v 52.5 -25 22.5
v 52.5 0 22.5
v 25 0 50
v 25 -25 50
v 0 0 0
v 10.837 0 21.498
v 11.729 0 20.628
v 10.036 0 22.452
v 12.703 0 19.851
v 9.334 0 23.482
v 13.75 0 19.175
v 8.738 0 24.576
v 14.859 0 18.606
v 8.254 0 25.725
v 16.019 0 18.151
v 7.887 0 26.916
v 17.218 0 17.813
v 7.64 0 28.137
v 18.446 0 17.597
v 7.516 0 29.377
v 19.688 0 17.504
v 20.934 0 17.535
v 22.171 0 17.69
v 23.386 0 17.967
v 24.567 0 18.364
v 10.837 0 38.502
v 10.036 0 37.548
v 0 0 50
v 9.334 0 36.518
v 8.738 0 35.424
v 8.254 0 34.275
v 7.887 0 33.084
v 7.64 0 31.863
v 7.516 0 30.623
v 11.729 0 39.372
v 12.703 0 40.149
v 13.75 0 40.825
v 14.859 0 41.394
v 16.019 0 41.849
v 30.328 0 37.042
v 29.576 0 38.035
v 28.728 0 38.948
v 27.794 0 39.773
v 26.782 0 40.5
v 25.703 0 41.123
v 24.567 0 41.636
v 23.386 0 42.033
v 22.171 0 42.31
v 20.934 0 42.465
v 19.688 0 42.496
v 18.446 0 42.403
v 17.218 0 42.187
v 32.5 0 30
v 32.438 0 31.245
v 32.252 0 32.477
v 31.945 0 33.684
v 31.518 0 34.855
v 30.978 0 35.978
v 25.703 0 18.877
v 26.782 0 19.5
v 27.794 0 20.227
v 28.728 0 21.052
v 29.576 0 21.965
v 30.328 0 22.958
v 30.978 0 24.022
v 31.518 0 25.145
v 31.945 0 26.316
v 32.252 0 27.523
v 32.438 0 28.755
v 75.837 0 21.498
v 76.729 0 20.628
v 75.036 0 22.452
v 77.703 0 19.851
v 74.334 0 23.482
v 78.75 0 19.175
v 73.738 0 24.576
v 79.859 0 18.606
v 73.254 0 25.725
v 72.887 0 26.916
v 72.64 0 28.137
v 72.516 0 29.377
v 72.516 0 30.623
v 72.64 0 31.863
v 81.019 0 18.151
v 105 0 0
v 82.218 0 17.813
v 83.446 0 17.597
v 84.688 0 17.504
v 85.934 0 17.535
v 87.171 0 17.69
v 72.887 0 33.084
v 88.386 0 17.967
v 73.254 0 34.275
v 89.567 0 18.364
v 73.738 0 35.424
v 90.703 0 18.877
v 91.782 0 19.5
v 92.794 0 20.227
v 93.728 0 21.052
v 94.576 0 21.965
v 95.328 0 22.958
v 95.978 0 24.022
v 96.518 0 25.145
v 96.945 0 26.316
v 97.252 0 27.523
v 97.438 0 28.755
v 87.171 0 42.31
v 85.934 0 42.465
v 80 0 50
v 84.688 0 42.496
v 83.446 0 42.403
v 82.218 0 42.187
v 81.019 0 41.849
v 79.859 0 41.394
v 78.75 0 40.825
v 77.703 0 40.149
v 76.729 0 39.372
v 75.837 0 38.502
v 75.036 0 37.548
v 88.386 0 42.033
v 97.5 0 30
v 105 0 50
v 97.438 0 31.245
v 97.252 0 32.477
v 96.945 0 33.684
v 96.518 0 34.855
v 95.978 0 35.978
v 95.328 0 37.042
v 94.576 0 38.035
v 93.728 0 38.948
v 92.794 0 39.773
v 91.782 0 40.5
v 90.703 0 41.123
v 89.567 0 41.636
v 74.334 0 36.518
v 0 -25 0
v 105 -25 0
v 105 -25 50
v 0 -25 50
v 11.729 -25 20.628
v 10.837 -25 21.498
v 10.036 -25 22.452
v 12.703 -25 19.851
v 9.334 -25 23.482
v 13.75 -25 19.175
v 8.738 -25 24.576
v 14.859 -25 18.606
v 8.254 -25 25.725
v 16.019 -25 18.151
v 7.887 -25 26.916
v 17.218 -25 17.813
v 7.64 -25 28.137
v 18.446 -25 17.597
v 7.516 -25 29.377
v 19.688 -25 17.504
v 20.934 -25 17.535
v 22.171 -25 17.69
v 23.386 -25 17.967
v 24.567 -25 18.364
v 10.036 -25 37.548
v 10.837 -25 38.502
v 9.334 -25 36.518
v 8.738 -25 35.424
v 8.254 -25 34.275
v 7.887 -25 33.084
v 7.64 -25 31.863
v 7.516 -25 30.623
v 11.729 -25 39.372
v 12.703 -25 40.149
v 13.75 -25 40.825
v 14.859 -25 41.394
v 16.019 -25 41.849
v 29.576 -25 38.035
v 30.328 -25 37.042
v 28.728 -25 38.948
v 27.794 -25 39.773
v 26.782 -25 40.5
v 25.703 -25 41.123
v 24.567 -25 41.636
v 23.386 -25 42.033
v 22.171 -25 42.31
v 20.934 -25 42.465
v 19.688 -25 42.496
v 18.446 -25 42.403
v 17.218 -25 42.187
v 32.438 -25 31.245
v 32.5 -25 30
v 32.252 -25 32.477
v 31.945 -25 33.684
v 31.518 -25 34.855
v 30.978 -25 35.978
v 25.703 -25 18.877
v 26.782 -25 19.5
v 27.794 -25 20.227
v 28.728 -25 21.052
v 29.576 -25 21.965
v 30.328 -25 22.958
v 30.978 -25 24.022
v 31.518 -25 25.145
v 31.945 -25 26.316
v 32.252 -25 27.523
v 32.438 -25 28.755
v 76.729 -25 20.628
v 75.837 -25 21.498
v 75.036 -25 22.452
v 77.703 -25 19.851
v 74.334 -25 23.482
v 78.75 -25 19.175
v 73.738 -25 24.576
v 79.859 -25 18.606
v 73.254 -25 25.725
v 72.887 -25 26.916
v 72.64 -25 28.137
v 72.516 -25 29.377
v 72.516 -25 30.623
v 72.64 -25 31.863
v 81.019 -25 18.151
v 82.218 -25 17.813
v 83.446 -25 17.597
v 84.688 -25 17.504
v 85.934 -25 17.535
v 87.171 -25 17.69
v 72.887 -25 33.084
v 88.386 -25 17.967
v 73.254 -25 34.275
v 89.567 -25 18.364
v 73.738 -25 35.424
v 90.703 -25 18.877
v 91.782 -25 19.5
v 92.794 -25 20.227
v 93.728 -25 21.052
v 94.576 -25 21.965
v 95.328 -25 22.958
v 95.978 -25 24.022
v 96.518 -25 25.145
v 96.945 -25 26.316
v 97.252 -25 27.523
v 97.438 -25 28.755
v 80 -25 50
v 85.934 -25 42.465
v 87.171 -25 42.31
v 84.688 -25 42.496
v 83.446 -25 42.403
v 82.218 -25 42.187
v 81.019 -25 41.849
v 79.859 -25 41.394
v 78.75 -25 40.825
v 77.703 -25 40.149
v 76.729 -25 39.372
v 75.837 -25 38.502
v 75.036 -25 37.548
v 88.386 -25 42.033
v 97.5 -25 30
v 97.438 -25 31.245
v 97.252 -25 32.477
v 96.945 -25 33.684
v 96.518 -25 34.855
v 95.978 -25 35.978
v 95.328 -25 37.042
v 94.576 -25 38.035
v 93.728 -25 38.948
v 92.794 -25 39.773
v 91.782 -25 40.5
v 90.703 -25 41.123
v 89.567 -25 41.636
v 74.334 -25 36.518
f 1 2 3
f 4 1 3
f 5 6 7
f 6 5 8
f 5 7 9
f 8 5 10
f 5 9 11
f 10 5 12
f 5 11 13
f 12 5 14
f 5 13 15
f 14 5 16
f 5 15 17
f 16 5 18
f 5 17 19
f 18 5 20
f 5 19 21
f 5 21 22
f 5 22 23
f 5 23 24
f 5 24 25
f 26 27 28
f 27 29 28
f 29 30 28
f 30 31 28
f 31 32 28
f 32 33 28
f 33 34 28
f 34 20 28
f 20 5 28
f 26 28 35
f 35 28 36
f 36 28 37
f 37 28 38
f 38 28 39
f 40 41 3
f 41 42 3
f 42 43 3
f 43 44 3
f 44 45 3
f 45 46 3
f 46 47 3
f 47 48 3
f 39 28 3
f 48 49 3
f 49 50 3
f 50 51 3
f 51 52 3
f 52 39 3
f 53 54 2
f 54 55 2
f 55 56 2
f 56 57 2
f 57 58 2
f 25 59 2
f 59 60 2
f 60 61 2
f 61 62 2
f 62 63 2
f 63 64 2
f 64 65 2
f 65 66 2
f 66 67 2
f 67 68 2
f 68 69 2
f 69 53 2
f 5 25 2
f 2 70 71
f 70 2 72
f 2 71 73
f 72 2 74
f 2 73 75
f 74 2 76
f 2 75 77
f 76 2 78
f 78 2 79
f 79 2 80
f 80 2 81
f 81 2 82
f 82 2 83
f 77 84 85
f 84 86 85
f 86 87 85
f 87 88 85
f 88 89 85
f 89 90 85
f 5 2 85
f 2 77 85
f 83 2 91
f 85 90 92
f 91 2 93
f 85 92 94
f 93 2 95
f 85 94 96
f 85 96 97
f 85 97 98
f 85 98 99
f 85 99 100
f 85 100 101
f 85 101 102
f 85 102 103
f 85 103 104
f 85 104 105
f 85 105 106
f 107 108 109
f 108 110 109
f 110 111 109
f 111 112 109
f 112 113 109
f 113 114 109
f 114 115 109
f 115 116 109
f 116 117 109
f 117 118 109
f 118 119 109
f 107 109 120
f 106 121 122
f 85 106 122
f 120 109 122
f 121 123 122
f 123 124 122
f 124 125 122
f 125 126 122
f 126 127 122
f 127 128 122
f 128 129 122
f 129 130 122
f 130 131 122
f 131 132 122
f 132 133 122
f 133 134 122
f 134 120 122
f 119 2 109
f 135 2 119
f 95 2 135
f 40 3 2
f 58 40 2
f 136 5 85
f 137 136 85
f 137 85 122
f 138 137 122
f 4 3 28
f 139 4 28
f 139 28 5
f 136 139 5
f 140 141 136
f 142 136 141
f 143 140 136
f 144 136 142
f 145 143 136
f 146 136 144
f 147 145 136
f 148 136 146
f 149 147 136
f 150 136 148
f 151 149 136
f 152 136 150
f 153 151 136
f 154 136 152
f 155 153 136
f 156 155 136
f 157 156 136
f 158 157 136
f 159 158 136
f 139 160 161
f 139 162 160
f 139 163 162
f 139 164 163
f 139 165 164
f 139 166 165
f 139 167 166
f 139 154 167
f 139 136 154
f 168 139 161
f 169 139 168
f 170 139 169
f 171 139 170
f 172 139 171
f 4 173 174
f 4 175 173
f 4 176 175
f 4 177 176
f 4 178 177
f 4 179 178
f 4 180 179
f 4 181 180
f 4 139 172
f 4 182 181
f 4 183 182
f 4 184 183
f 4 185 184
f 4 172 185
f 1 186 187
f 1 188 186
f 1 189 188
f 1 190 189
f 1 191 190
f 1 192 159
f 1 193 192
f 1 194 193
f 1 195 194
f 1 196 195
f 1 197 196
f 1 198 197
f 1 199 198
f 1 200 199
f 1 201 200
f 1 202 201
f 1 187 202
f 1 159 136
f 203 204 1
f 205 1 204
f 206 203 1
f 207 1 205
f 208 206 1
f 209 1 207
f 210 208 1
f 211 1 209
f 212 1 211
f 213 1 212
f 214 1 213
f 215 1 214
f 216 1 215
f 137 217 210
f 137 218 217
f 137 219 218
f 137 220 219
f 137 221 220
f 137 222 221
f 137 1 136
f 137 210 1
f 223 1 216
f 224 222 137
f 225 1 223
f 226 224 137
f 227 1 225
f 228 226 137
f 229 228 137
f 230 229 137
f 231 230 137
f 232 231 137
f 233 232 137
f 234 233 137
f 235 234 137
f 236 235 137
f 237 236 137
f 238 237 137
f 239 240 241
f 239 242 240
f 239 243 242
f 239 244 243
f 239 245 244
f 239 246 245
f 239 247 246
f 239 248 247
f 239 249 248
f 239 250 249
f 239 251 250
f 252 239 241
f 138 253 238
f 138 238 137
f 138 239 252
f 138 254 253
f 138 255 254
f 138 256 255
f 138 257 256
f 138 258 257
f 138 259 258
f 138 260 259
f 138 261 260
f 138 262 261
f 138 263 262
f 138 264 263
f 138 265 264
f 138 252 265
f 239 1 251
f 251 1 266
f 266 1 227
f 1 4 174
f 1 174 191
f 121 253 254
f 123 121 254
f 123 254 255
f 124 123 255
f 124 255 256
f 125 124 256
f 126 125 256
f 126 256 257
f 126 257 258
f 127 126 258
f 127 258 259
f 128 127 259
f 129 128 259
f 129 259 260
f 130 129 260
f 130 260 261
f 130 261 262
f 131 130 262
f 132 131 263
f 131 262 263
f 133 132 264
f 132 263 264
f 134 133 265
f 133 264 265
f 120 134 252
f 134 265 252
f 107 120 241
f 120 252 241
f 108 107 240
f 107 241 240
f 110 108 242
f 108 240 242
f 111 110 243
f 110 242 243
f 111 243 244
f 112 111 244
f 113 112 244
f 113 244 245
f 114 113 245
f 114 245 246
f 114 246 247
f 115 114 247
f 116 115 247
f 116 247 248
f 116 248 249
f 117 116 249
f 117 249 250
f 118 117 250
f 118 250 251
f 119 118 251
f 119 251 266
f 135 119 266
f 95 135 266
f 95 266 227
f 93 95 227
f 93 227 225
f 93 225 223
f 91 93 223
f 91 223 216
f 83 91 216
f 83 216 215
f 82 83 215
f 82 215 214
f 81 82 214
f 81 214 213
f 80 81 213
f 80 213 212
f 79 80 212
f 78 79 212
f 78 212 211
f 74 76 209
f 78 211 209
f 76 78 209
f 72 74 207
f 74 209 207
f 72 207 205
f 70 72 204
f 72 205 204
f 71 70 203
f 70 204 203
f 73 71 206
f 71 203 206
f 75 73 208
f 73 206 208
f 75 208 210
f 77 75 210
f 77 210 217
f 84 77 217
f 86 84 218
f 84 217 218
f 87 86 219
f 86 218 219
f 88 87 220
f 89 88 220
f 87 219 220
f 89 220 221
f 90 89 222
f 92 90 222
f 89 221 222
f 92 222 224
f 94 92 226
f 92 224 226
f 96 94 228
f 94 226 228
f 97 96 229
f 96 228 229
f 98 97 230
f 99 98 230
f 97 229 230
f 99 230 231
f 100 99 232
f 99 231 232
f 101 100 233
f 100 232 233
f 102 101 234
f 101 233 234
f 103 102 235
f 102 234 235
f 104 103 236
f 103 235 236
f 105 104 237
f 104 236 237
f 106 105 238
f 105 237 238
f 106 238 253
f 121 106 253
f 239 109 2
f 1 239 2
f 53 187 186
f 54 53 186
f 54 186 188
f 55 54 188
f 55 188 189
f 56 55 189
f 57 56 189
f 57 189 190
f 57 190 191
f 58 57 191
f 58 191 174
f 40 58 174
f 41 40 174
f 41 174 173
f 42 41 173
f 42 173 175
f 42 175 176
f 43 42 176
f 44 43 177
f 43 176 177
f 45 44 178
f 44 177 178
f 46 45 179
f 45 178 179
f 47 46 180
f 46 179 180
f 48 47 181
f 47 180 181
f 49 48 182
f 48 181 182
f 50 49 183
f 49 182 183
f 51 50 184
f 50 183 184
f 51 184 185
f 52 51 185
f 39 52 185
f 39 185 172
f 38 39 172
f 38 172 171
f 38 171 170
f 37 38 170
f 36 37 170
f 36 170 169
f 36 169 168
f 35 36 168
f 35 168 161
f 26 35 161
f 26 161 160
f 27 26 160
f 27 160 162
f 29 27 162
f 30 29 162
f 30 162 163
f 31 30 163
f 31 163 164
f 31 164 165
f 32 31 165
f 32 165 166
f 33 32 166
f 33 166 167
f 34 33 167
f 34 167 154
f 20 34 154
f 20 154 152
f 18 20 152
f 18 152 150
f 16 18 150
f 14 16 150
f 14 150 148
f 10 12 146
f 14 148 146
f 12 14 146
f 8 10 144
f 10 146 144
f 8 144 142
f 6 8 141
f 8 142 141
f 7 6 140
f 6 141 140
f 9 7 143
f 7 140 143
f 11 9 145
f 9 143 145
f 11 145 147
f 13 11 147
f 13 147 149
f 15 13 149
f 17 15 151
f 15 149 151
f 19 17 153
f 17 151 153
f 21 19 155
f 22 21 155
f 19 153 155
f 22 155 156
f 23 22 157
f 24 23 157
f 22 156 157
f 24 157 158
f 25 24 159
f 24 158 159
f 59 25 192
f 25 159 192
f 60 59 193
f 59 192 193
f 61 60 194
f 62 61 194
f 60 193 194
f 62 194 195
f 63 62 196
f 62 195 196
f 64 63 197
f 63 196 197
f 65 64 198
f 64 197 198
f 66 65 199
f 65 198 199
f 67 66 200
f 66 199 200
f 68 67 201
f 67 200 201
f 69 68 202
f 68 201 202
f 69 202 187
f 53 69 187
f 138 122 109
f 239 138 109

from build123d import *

# Parameters (mm, degrees)
F1_DEPTH = 25
F2_R     = 12.5
F3_DEPTH = 25.001


with BuildPart() as f1:
    # F0 (on Front) → F1 (new body)
    with BuildSketch(Plane.XZ):
        Polygon((0, 50), (0, 0), (105, 0), (105, 50), (80, 50), (52.5, 22.5), (25, 50), align=None)
    extrude(amount=F1_DEPTH)

    # F2 (on face) → F3 (cut, through all)
    with BuildSketch(Plane.XZ.offset(25)):
        with Locations((20, 30)):
            Circle(F2_R)
        with Locations((85, 30)):
            Circle(F2_R)
    extrude(amount=-F3_DEPTH, mode=Mode.SUBTRACT)


solid = f1.part
